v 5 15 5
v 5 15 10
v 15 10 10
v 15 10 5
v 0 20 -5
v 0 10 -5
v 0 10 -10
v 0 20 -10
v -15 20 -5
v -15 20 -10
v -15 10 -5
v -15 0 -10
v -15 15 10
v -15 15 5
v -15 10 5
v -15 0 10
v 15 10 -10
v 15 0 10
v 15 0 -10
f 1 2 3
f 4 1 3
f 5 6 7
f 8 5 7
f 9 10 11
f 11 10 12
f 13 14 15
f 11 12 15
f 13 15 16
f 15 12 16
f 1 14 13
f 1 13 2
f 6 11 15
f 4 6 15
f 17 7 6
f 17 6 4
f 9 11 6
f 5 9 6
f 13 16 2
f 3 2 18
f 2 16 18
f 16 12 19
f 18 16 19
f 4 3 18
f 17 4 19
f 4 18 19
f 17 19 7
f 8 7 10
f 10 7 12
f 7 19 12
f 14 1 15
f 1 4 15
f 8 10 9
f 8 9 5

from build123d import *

# Parameters (mm, degrees)
SKETCH_1_W          = 30
SKETCH_1_H          = 20
EXTRUDE_1_DEPTH     = 10
SKETCH_1_3_W        = 30
SKETCH_1_3_H        = 5
EXTRUDE_2_DEPTH     = 15
SKETCH_1_4_W        = 15
SKETCH_1_4_H        = 5
EXTRUDE_3_DEPTH     = 20
CUT_EXTRUDE_1_DEPTH = 20


with BuildPart() as part:
    # 草圖1 → 填料-伸長1 (new body)
    with BuildSketch(Plane(origin=(0, 0, 0), x_dir=(1, 0, 0), z_dir=(0, 1, 0))):
        Rectangle(SKETCH_1_W, SKETCH_1_H)
    extrude(amount=EXTRUDE_1_DEPTH)

    # 草圖1<3> → 填料-伸長2 (add)
    with BuildSketch(Plane(origin=(0, 0, 0), x_dir=(1, 0, 0), z_dir=(0, 1, 0))):
        with Locations((0, -7.5)):
            Rectangle(SKETCH_1_3_W, SKETCH_1_3_H)
    extrude(amount=EXTRUDE_2_DEPTH)

    # 草圖1<4> → 填料-伸長3 (add)
    with BuildSketch(Plane(origin=(0, 0, 0), x_dir=(1, 0, 0), z_dir=(0, 1, 0))):
        with Locations((-7.5, 7.5)):
            Rectangle(SKETCH_1_4_W, SKETCH_1_4_H)
    extrude(amount=EXTRUDE_3_DEPTH)

    # 草圖2 → 除料-伸長1 (cut)
    with BuildSketch(Plane.XY.offset(10)):
        Polygon((5, 15), (15, 10), (15, 15), align=None)
    extrude(amount=-CUT_EXTRUDE_1_DEPTH, mode=Mode.SUBTRACT)


solid = part.part
